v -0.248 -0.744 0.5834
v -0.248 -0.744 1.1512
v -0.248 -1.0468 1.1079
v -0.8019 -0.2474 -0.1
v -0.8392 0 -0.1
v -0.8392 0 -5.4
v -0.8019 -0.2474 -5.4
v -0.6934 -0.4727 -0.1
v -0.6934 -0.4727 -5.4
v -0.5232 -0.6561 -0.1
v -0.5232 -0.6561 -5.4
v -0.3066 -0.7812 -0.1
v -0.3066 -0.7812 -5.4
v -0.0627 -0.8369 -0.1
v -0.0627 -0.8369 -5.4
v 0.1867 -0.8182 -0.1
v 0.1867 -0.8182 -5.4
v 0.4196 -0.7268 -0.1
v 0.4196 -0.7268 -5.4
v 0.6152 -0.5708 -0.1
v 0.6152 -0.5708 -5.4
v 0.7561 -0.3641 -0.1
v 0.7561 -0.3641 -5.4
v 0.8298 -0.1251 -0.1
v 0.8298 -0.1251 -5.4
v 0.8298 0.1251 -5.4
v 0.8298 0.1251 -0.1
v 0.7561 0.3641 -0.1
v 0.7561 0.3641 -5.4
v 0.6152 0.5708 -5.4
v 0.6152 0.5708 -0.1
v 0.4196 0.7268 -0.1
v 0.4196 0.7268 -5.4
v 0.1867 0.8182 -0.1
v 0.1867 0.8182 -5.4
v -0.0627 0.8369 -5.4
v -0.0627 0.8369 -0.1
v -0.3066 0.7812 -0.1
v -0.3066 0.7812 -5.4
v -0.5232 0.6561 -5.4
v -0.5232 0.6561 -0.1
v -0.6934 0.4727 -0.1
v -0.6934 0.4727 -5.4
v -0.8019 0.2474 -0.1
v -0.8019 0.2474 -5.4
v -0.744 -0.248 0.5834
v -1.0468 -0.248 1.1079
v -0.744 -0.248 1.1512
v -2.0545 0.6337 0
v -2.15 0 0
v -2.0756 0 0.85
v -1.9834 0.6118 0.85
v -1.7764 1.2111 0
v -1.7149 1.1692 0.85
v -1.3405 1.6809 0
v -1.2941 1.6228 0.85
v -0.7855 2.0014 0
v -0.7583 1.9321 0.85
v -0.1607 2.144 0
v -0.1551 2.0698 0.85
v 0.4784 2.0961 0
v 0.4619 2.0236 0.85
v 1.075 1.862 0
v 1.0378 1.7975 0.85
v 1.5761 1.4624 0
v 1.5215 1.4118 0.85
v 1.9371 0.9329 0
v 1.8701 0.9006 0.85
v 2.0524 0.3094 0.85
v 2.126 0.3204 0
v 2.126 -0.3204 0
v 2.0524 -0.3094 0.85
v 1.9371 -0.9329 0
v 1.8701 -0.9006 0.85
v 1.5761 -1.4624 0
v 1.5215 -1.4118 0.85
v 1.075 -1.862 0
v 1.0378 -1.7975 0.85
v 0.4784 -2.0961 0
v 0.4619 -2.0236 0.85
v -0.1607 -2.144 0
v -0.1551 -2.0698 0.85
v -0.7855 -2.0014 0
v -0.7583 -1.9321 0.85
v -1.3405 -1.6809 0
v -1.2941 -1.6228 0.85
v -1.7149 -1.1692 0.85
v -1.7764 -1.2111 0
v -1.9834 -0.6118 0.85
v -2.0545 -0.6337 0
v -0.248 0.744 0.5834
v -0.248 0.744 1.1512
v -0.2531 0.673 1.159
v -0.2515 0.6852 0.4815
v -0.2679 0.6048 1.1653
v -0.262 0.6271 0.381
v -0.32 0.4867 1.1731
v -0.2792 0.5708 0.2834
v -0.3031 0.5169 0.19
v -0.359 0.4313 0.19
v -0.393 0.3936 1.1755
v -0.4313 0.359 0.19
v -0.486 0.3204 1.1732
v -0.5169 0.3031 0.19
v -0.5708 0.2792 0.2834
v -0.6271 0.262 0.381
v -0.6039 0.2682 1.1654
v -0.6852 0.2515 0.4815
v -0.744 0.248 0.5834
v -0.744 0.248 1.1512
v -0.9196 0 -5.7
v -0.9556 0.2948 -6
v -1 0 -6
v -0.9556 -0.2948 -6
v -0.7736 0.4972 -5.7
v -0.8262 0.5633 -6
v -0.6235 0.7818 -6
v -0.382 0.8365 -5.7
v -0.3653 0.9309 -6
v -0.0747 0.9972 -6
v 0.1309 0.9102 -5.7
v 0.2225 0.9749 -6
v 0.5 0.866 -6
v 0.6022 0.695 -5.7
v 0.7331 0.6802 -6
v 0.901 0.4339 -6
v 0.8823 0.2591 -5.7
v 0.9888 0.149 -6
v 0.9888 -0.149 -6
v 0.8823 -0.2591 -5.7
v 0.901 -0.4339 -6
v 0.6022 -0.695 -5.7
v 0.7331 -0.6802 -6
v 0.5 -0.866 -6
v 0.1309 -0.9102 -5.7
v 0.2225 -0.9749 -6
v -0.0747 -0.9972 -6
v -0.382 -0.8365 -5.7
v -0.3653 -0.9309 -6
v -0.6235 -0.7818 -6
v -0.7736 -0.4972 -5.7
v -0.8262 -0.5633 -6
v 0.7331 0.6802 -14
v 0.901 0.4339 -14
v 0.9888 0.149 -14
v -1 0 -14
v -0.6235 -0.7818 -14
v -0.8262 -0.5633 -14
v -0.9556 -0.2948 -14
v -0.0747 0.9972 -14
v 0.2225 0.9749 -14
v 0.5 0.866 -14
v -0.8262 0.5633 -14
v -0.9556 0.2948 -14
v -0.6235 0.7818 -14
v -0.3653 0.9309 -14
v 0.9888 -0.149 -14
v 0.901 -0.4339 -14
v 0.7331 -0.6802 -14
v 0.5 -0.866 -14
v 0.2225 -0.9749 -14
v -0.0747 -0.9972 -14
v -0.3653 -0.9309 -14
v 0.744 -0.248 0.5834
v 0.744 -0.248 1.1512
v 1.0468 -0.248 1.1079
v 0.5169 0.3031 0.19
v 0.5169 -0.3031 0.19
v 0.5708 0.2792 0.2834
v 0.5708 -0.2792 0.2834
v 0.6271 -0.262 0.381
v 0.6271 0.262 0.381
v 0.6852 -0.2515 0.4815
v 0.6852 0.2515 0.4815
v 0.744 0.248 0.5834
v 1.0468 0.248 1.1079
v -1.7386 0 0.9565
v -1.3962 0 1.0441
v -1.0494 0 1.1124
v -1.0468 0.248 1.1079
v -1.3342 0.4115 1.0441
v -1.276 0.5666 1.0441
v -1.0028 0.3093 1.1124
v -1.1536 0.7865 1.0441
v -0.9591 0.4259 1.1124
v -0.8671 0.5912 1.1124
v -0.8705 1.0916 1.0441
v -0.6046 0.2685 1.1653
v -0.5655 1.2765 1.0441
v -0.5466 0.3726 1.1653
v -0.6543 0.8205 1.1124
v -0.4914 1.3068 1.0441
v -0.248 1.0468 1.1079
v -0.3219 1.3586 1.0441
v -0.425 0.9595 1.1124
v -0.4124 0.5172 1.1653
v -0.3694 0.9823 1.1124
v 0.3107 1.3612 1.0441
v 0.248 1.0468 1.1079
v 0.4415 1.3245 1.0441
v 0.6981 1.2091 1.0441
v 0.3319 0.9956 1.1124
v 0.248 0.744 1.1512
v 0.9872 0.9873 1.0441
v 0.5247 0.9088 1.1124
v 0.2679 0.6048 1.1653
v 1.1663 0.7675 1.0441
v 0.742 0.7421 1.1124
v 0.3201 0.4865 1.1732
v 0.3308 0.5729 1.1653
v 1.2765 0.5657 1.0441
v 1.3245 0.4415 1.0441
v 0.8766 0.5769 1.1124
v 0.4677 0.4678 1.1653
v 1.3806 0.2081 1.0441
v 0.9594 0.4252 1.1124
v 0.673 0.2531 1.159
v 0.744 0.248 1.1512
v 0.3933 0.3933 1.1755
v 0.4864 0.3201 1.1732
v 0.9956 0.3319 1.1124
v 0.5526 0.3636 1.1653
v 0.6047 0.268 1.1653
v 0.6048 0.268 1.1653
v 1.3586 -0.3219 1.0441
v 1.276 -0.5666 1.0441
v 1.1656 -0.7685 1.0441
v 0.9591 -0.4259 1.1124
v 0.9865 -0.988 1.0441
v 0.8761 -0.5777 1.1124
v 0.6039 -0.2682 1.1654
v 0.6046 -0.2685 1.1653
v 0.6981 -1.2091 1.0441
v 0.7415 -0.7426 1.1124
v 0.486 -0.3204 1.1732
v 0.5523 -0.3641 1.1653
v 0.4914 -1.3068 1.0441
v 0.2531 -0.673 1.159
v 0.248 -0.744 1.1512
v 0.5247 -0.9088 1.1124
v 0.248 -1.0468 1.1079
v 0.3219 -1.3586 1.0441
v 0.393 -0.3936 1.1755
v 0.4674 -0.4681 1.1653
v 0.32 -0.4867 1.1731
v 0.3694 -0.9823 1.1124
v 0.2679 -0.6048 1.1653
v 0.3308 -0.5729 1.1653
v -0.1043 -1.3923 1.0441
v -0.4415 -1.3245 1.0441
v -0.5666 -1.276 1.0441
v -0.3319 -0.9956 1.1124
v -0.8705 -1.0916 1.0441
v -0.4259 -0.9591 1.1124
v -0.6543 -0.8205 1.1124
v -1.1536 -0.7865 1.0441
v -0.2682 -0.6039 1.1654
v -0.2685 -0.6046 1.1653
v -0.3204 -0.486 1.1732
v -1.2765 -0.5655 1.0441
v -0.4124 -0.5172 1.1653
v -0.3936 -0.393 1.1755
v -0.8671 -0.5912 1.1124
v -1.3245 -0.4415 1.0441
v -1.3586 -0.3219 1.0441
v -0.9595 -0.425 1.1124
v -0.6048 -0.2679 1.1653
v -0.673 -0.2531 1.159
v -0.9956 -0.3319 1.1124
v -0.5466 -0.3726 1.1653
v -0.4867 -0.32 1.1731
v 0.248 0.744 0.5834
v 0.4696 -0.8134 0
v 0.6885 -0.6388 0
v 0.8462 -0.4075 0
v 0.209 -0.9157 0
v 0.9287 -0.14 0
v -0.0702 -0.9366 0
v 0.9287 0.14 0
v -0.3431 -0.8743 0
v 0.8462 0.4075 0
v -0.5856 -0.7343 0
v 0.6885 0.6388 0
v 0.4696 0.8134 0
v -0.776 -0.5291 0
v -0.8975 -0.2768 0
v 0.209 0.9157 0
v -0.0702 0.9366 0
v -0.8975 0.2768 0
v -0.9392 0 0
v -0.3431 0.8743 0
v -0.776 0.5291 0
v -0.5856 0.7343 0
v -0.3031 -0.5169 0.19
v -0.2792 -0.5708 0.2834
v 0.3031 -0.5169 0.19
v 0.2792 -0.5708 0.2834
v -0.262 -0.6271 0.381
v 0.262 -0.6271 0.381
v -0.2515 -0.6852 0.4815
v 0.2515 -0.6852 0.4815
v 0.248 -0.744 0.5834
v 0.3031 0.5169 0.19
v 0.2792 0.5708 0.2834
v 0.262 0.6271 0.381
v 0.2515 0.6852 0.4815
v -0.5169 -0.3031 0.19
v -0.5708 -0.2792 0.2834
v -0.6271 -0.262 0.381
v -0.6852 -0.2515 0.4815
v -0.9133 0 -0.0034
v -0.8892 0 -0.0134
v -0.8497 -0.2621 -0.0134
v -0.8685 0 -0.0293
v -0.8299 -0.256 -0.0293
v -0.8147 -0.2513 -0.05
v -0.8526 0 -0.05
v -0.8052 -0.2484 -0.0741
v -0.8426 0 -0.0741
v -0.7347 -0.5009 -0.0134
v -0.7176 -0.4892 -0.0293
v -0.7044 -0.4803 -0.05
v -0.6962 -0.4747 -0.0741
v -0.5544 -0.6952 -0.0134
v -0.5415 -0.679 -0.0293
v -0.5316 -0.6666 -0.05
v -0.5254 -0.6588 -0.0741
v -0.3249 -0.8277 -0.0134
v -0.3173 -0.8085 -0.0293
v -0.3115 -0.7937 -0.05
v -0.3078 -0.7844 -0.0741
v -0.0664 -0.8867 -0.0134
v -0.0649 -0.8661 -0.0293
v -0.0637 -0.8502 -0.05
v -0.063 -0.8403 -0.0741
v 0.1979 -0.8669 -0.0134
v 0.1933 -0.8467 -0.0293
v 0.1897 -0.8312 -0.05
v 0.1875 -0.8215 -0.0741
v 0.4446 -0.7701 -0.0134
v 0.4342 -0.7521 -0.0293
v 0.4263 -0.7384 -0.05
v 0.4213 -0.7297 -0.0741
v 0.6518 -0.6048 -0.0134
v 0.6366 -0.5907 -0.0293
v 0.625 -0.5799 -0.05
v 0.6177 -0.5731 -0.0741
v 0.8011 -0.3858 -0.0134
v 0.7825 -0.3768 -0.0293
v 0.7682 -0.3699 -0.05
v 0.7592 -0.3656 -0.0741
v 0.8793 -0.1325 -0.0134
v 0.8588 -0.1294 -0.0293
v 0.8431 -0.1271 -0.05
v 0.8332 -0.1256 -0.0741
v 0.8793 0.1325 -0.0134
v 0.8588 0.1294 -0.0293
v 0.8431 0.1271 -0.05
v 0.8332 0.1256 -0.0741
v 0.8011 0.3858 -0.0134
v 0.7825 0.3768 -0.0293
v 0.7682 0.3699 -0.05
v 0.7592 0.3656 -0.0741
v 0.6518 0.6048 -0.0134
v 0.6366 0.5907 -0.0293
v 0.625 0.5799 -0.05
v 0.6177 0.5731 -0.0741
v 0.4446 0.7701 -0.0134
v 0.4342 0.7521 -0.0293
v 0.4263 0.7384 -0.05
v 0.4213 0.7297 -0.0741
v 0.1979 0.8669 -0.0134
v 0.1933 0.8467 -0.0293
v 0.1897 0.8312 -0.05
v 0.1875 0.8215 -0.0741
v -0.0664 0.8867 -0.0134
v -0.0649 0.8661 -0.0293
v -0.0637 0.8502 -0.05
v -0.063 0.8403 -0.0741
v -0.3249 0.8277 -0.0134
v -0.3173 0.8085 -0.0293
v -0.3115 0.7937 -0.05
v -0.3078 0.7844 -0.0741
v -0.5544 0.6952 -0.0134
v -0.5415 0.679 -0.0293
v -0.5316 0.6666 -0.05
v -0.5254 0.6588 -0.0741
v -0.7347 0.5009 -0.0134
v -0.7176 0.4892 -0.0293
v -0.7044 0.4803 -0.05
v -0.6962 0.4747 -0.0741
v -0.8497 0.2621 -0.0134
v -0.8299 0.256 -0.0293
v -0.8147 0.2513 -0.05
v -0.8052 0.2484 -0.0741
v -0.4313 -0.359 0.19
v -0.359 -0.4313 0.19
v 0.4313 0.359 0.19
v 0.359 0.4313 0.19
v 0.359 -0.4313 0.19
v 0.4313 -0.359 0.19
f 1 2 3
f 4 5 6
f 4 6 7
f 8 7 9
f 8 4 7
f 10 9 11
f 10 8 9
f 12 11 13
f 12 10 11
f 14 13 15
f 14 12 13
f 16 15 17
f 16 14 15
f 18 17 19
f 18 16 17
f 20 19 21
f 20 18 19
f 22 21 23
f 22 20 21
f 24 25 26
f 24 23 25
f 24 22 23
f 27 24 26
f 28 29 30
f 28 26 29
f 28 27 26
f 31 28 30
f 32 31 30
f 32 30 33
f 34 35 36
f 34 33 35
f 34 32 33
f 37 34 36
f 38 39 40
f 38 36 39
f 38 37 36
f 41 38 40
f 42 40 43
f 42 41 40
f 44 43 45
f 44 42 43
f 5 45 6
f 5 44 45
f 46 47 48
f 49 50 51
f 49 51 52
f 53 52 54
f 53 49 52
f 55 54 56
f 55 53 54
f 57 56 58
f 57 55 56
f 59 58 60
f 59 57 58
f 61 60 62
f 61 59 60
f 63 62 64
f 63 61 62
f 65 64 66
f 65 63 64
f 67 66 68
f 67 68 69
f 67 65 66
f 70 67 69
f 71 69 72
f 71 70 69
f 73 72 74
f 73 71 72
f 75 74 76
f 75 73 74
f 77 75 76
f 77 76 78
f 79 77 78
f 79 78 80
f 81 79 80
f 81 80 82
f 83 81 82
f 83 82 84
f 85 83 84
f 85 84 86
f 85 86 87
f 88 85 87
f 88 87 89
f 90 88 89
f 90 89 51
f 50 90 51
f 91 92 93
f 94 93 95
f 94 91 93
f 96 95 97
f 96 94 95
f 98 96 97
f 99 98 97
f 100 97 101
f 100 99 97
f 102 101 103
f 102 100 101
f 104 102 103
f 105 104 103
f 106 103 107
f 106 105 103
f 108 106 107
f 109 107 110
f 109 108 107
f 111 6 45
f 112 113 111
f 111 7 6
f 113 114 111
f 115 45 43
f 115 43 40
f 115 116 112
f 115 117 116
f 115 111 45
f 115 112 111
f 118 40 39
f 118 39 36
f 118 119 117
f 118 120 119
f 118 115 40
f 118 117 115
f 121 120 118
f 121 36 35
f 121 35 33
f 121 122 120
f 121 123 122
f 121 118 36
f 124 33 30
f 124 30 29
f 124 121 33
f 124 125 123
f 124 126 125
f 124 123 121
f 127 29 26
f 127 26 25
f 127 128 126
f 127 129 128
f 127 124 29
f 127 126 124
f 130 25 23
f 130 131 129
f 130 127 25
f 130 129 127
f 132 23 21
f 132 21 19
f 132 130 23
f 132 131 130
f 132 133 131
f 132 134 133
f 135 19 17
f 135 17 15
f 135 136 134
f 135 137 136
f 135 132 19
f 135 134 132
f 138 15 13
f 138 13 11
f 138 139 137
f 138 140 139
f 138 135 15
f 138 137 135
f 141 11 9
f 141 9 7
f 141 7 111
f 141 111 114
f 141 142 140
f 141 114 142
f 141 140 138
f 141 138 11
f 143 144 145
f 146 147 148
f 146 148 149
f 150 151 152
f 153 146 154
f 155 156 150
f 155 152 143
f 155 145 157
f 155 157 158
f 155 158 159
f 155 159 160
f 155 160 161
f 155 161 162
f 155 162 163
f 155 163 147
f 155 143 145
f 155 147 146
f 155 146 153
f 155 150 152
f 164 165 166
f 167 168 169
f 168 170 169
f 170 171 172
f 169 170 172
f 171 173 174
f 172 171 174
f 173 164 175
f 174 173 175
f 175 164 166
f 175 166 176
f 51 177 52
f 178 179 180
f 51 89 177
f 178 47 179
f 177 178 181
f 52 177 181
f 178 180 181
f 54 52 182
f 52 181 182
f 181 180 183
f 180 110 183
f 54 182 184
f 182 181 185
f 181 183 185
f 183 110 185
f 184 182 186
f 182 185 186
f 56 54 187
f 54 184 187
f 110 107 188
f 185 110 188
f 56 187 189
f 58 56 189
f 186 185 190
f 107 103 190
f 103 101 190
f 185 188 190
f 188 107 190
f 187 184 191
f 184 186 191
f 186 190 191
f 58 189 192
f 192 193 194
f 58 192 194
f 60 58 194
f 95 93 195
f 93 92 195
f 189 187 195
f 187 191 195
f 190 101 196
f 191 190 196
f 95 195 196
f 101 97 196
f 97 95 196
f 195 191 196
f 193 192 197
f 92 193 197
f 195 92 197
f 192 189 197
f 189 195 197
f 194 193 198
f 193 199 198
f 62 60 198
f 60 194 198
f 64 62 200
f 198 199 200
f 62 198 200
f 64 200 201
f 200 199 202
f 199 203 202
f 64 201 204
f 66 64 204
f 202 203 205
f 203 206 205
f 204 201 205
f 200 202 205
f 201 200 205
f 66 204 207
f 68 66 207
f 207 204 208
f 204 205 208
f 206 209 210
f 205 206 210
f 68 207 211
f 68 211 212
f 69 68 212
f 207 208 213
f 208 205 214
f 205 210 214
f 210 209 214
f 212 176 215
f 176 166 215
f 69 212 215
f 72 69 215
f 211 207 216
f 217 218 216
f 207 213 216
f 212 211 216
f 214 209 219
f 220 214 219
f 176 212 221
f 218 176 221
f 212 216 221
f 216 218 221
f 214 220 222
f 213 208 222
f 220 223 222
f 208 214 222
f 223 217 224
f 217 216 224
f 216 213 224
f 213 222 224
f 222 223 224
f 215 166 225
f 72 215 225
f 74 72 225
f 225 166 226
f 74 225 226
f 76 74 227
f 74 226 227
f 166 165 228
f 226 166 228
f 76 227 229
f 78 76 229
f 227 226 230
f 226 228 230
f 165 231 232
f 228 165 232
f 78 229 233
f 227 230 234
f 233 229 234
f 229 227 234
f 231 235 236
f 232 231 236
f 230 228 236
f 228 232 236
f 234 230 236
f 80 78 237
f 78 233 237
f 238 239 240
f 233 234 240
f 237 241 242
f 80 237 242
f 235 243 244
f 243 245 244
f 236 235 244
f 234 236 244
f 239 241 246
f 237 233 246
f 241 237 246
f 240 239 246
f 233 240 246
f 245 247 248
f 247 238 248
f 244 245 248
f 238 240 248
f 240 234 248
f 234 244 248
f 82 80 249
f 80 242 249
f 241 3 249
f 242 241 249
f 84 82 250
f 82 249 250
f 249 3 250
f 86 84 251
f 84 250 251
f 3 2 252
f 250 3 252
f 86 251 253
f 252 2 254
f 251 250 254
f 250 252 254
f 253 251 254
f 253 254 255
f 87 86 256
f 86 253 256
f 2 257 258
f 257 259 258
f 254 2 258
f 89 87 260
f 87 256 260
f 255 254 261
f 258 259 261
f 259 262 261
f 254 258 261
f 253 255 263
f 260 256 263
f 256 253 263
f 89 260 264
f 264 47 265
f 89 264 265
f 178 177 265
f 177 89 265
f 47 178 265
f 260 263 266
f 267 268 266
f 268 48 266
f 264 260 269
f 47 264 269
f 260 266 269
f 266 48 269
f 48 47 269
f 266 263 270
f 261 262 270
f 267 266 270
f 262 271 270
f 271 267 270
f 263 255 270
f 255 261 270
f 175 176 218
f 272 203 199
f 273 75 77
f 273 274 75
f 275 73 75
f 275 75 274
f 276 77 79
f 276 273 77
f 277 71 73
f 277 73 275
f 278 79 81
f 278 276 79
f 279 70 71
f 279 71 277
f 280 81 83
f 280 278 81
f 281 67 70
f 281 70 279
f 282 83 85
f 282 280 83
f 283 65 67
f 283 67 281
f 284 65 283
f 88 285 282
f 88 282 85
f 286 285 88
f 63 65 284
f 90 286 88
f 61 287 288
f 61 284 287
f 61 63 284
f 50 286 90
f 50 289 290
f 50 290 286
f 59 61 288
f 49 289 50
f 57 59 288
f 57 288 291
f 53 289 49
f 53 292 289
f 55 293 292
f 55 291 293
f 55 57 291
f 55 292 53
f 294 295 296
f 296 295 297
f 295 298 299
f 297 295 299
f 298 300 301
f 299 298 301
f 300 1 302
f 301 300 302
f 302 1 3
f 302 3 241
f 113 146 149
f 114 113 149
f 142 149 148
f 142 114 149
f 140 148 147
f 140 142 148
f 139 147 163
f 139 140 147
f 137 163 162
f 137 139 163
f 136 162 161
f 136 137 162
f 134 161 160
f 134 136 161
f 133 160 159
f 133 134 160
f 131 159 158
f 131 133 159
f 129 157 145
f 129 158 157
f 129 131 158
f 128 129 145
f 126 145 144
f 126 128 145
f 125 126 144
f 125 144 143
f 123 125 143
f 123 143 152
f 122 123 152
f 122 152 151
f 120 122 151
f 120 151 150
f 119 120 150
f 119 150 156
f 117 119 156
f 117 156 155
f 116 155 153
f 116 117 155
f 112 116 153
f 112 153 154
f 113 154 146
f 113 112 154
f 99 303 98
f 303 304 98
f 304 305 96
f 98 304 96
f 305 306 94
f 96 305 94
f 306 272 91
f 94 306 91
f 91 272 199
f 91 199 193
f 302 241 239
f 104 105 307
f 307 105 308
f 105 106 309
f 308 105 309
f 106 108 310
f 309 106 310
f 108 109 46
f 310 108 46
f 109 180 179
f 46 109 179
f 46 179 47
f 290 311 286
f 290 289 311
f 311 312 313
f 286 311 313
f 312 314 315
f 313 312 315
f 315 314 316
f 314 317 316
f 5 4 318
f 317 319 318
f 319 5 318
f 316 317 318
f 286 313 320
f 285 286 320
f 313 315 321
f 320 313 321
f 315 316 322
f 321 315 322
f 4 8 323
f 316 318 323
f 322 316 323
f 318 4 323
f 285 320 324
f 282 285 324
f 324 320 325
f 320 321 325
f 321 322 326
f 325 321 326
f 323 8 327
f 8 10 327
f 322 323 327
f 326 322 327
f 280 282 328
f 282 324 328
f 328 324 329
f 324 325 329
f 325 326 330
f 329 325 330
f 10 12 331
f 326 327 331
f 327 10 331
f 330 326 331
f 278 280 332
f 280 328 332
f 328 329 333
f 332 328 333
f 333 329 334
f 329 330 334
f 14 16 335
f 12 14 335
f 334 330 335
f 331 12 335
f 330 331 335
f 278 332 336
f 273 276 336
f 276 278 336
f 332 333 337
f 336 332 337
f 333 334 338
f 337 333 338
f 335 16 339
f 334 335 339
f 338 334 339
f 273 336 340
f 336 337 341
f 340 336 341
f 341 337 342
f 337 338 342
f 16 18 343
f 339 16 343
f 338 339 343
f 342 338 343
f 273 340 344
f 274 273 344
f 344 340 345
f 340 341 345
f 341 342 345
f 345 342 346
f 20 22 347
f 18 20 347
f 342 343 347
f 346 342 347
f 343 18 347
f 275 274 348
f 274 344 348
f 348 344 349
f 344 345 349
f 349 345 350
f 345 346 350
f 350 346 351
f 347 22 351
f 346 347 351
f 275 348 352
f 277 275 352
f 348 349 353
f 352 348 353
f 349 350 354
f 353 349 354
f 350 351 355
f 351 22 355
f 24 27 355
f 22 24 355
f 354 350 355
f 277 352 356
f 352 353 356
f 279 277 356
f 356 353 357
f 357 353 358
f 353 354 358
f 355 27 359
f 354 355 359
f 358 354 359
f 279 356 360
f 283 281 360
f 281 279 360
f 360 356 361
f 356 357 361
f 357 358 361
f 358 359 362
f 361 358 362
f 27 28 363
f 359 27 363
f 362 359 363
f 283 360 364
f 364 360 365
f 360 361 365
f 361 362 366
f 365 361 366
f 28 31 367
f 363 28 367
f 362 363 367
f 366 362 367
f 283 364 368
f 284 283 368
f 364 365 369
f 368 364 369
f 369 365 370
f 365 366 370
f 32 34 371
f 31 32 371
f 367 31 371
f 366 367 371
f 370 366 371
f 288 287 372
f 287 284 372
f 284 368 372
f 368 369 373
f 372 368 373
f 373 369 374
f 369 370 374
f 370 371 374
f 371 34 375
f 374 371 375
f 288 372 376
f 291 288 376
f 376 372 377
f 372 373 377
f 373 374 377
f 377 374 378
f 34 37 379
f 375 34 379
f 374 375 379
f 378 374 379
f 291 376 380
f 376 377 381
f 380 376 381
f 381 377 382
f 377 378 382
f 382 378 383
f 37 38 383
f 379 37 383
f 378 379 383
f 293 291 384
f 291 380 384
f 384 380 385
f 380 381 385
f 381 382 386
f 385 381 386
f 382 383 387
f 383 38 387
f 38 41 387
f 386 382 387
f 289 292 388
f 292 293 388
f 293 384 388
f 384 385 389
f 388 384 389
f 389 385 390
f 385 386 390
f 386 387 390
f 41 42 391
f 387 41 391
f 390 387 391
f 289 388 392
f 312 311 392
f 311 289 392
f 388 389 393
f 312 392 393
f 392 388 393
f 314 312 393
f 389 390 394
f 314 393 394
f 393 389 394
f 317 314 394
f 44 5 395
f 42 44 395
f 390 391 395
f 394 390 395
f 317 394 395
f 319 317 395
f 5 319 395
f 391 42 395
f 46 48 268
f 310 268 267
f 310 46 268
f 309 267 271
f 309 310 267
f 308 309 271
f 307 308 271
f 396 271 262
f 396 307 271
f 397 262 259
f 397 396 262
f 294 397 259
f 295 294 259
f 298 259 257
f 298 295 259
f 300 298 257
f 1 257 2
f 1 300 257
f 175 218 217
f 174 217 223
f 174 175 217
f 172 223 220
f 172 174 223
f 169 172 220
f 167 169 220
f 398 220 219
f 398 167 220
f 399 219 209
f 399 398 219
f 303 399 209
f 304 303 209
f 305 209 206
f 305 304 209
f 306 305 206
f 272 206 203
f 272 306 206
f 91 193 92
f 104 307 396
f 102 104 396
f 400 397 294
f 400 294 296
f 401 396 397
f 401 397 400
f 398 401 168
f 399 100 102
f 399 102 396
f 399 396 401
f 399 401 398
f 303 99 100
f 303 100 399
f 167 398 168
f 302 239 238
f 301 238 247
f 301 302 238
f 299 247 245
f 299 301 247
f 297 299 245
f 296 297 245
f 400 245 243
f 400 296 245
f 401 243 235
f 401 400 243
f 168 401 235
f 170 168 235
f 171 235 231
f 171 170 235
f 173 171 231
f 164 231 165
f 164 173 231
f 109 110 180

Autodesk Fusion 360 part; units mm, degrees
sketch "Sketch1" plane through (0, 0, 0) normal (0, 1, 0) x (1, 0, 0)
  line L0 (0, -1.2) -> (0, 6)
  line L1 (-2.15, 0) -> (-2.0756, -0.85)
  line L2 (-2.15, 0) -> (-0.8392, 0)
  arc A0 (-2.0756, -0.85) -> (0, -1.2) centre (0, 5.1297) ccw
  line L3 (0, 6) -> (-1, 6)
  line L4 (-1, 6) -> (-1, 0.75)
  line L5 (-1, 0.75) -> (-0.8392, 0.15)
  line L6 (-0.8392, 0.15) -> (-0.8392, 0)
  dimension "d13" = 5
  dimension "d14" = 4.3
  dimension "d18" = 2
  dimension "d23" = 15
  dimension "d53" = 1.2
  dimension "d55" = 5.25
  dimension "d56" = 6
  dimension "d57" = 5.85
  dimension "d60" = 0.85
revolve "Revolve1" add sketch "Sketch1" angle 360 about axis through (0, 0, 1.2) along (0, 0, -1) makes body 1
fillet "Fillet2" radius 0.1 1 edges at (-0.7824, 0.3035, 0) on bodies 1
ref_plane "WorkPlane1" through (0, 0, 1.2) normal (0, 0, 1) x (1, 0, 0)
sketch "Sketch2" plane through (0, 0, 1.2) normal (0, 0, 1) x (1, 0, 0)
  line L0 (-0.248, 0.248) -> (-1.1, 0.248)
  line L1 (-1.1, 0.248) -> (-1.1, -0.248)
  line L2 (-1.1, -0.248) -> (-0.248, -0.248)
  line L3 (-0.248, -0.248) -> (-0.248, -1.1)
  line L4 (-0.248, -1.1) -> (0.248, -1.1)
  line L5 (0.248, -1.1) -> (0.248, -0.248)
  line L6 (0.248, -0.248) -> (1.1, -0.248)
  line L7 (1.1, -0.248) -> (1.1, 0.248)
  line L8 (1.1, 0.248) -> (0.248, 0.248)
  line L9 (0.248, 0.248) -> (0.248, 1.1)
  line L10 (0.248, 1.1) -> (-0.248, 1.1)
  line L11 (-0.248, 1.1) -> (-0.248, 0.248)
  dimension "d63" = 0.496
  dimension "d65" = 360
  dimension "d66" = 2.2
extrude "Extrude1" add sketch "Sketch2" against normal blind 1.01 separate body makes body 2
draft "Draft1" angle -30 neutral plane through (0, 0, 1.2) pull (0, 0, 1) 4 faces at (-0.0827, -1.1, 0.8633) (1.1, -0.0827, 0.8633) (0.0827, 1.1, 0.8633) (-1.1, 0.0827, 0.8633) on bodies 2
fillet "Fillet1" radius 0.496 4 edges at (0.248, -0.248, 0.695) (0.248, 0.248, 0.695) (-0.248, -0.248, 0.695) (-0.248, 0.248, 0.695) on bodies 2
combine "Combine1" operation cut target body 1 tool bodies 2
thread "Thread1" thread offset 0 thread length 10
equation "adsk_nomdia = 2.00 mm"
equation "adsk_nomlen = 6.00 mm"
equation "adsk_headdia = 4.30 mm"
equation "adsk_baseh = 0.85 mm"
equation "adsk_phildia = 2.20 mm"
equation "adsk_midfillet = 0.10 mm"
equation "adsk_thrlen = 5.25 mm"
equation "adsk_phildepth = 1.01 mm"
equation "adsk_thrrun = 0.60 mm"
equation "adsk_thrang = 15.00 deg"
equation "adsk_headang = 5.00 deg"
equation "d13 = adsk_headang"
equation "d14 = adsk_headdia"
equation "adsk_ovalh = 0.35 mm"
equation "d18 = adsk_nomdia"
equation "d23 = adsk_thrang"
equation "d32 = adsk_baseh + adsk_ovalh"
equation "adsk_philwidth = 0.496 mm"
equation "d52 = adsk_midfillet"
equation "d53 = adsk_baseh + adsk_ovalh"
equation "d55 = adsk_thrlen"
equation "d56 = adsk_nomlen"
equation "d57 = adsk_thrlen + adsk_thrrun"
equation "d60 = adsk_baseh"
equation "d63 = adsk_philwidth"
equation "d66 = adsk_phildia"
equation "d68 = adsk_philwidth"
properties part number "BHS JIS B 1111 - M2x6 Acero 4.6 Normal"

Autodesk Fusion 360 part; units mm, degrees
sketch "Sketch1" plane through (0, 0, 0) normal (0, 1, 0) x (1, 0, 0)
  line L0 (0, -1.2) -> (0, 10)
  line L1 (-2.15, 0) -> (-2.0756, -0.85)
  line L2 (-2.15, 0) -> (-0.8392, 0)
  arc A0 (-2.0756, -0.85) -> (0, -1.2) centre (0, 5.1297) ccw
  line L3 (0, 10) -> (-1, 10)
  line L4 (-1, 10) -> (-1, 2)
  line L5 (-1, 2) -> (-0.8392, 1.4)
  line L6 (-0.8392, 1.4) -> (-0.8392, 0)
  dimension "d13" = 5
  dimension "d14" = 4.3
  dimension "d18" = 2
  dimension "d23" = 15
  dimension "d53" = 1.2
  dimension "d55" = 8
  dimension "d56" = 10
  dimension "d57" = 8.6
  dimension "d60" = 0.85
revolve "Revolve1" add sketch "Sketch1" angle 360 about axis through (0, 0, 1.2) along (0, 0, -1) makes body 1
fillet "Fillet2" radius 0.1 1 edges at (-0.7824, 0.3035, 0) on bodies 1
ref_plane "WorkPlane1" through (0, 0, 1.2) normal (0, 0, 1) x (1, 0, 0)
sketch "Sketch2" plane through (0, 0, 1.2) normal (0, 0, 1) x (1, 0, 0)
  line L0 (-0.248, 0.248) -> (-1.1, 0.248)
  line L1 (-1.1, 0.248) -> (-1.1, -0.248)
  line L2 (-1.1, -0.248) -> (-0.248, -0.248)
  line L3 (-0.248, -0.248) -> (-0.248, -1.1)
  line L4 (-0.248, -1.1) -> (0.248, -1.1)
  line L5 (0.248, -1.1) -> (0.248, -0.248)
  line L6 (0.248, -0.248) -> (1.1, -0.248)
  line L7 (1.1, -0.248) -> (1.1, 0.248)
  line L8 (1.1, 0.248) -> (0.248, 0.248)
  line L9 (0.248, 0.248) -> (0.248, 1.1)
  line L10 (0.248, 1.1) -> (-0.248, 1.1)
  line L11 (-0.248, 1.1) -> (-0.248, 0.248)
  dimension "d63" = 0.496
  dimension "d65" = 360
  dimension "d66" = 2.2
extrude "Extrude1" add sketch "Sketch2" against normal blind 1.01 separate body makes body 2
draft "Draft1" angle -30 neutral plane through (0, 0, 1.2) pull (0, 0, 1) 4 faces at (-0.0827, -1.1, 0.8633) (1.1, -0.0827, 0.8633) (0.0827, 1.1, 0.8633) (-1.1, 0.0827, 0.8633) on bodies 2
fillet "Fillet1" radius 0.496 4 edges at (0.248, -0.248, 0.695) (0.248, 0.248, 0.695) (-0.248, -0.248, 0.695) (-0.248, 0.248, 0.695) on bodies 2
combine "Combine1" operation cut target body 1 tool bodies 2
thread "Thread1" thread offset 0 thread length 10
equation "adsk_nomdia = 2.00 mm"
equation "adsk_nomlen = 10.00 mm"
equation "adsk_headdia = 4.30 mm"
equation "adsk_baseh = 0.85 mm"
equation "adsk_phildia = 2.20 mm"
equation "adsk_midfillet = 0.10 mm"
equation "adsk_thrlen = 8.00 mm"
equation "adsk_phildepth = 1.01 mm"
equation "adsk_thrrun = 0.60 mm"
equation "adsk_thrang = 15.00 deg"
equation "adsk_headang = 5.00 deg"
equation "d13 = adsk_headang"
equation "d14 = adsk_headdia"
equation "adsk_ovalh = 0.35 mm"
equation "d18 = adsk_nomdia"
equation "d23 = adsk_thrang"
equation "d32 = adsk_baseh + adsk_ovalh"
equation "adsk_philwidth = 0.496 mm"
equation "d52 = adsk_midfillet"
equation "d53 = adsk_baseh + adsk_ovalh"
equation "d55 = adsk_thrlen"
equation "d56 = adsk_nomlen"
equation "d57 = adsk_thrlen + adsk_thrrun"
equation "d60 = adsk_baseh"
equation "d63 = adsk_philwidth"
equation "d66 = adsk_phildia"
equation "d68 = adsk_philwidth"
properties part number "BHS JIS B 1111 - M2x10 Acero 4.6 Normal"

Autodesk Fusion 360 part; units mm, degrees
sketch "Sketch1" plane through (0, 0, 0) normal (0, 1, 0) x (1, 0, 0)
  line L0 (0, -1.2) -> (0, 14)
  line L1 (-2.15, 0) -> (-2.0756, -0.85)
  line L2 (-2.15, 0) -> (-0.8392, 0)
  arc A0 (-2.0756, -0.85) -> (0, -1.2) centre (0, 5.1297) ccw
  line L3 (0, 14) -> (-1, 14)
  line L4 (-1, 14) -> (-1, 6)
  line L5 (-1, 6) -> (-0.8392, 5.4)
  line L6 (-0.8392, 5.4) -> (-0.8392, 0)
  dimension "d13" = 5
  dimension "d14" = 4.3
  dimension "d18" = 2
  dimension "d23" = 15
  dimension "d53" = 1.2
  dimension "d55" = 8
  dimension "d56" = 14
  dimension "d57" = 8.6
  dimension "d60" = 0.85
revolve "Revolve1" add sketch "Sketch1" angle 360 about axis through (0, 0, 1.2) along (0, 0, -1) makes body 1
fillet "Fillet2" radius 0.1 1 edges at (-0.7824, 0.3035, 0) on bodies 1
ref_plane "WorkPlane1" through (0, 0, 1.2) normal (0, 0, 1) x (1, 0, 0)
sketch "Sketch2" plane through (0, 0, 1.2) normal (0, 0, 1) x (1, 0, 0)
  line L0 (-0.248, 0.248) -> (-1.1, 0.248)
  line L1 (-1.1, 0.248) -> (-1.1, -0.248)
  line L2 (-1.1, -0.248) -> (-0.248, -0.248)
  line L3 (-0.248, -0.248) -> (-0.248, -1.1)
  line L4 (-0.248, -1.1) -> (0.248, -1.1)
  line L5 (0.248, -1.1) -> (0.248, -0.248)
  line L6 (0.248, -0.248) -> (1.1, -0.248)
  line L7 (1.1, -0.248) -> (1.1, 0.248)
  line L8 (1.1, 0.248) -> (0.248, 0.248)
  line L9 (0.248, 0.248) -> (0.248, 1.1)
  line L10 (0.248, 1.1) -> (-0.248, 1.1)
  line L11 (-0.248, 1.1) -> (-0.248, 0.248)
  dimension "d63" = 0.496
  dimension "d65" = 360
  dimension "d66" = 2.2
extrude "Extrude1" add sketch "Sketch2" against normal blind 1.01 separate body makes body 2
draft "Draft1" angle -30 neutral plane through (0, 0, 1.2) pull (0, 0, 1) 4 faces at (-0.0827, -1.1, 0.8633) (1.1, -0.0827, 0.8633) (0.0827, 1.1, 0.8633) (-1.1, 0.0827, 0.8633) on bodies 2
fillet "Fillet1" radius 0.496 4 edges at (0.248, -0.248, 0.695) (0.248, 0.248, 0.695) (-0.248, -0.248, 0.695) (-0.248, 0.248, 0.695) on bodies 2
combine "Combine1" operation cut target body 1 tool bodies 2
thread "Thread1" thread offset 0 thread length 10
equation "adsk_nomdia = 2.00 mm"
equation "adsk_nomlen = 14.00 mm"
equation "adsk_headdia = 4.30 mm"
equation "adsk_baseh = 0.85 mm"
equation "adsk_phildia = 2.20 mm"
equation "adsk_midfillet = 0.10 mm"
equation "adsk_thrlen = 8.00 mm"
equation "adsk_phildepth = 1.01 mm"
equation "adsk_thrrun = 0.60 mm"
equation "adsk_thrang = 15.00 deg"
equation "adsk_headang = 5.00 deg"
equation "d13 = adsk_headang"
equation "d14 = adsk_headdia"
equation "adsk_ovalh = 0.35 mm"
equation "d18 = adsk_nomdia"
equation "d23 = adsk_thrang"
equation "d32 = adsk_baseh + adsk_ovalh"
equation "adsk_philwidth = 0.496 mm"
equation "d52 = adsk_midfillet"
equation "d53 = adsk_baseh + adsk_ovalh"
equation "d55 = adsk_thrlen"
equation "d56 = adsk_nomlen"
equation "d57 = adsk_thrlen + adsk_thrrun"
equation "d60 = adsk_baseh"
equation "d63 = adsk_philwidth"
equation "d66 = adsk_phildia"
equation "d68 = adsk_philwidth"
properties part number "BHS JIS B 1111 - M2x14 Acero 4.6 Normal"
